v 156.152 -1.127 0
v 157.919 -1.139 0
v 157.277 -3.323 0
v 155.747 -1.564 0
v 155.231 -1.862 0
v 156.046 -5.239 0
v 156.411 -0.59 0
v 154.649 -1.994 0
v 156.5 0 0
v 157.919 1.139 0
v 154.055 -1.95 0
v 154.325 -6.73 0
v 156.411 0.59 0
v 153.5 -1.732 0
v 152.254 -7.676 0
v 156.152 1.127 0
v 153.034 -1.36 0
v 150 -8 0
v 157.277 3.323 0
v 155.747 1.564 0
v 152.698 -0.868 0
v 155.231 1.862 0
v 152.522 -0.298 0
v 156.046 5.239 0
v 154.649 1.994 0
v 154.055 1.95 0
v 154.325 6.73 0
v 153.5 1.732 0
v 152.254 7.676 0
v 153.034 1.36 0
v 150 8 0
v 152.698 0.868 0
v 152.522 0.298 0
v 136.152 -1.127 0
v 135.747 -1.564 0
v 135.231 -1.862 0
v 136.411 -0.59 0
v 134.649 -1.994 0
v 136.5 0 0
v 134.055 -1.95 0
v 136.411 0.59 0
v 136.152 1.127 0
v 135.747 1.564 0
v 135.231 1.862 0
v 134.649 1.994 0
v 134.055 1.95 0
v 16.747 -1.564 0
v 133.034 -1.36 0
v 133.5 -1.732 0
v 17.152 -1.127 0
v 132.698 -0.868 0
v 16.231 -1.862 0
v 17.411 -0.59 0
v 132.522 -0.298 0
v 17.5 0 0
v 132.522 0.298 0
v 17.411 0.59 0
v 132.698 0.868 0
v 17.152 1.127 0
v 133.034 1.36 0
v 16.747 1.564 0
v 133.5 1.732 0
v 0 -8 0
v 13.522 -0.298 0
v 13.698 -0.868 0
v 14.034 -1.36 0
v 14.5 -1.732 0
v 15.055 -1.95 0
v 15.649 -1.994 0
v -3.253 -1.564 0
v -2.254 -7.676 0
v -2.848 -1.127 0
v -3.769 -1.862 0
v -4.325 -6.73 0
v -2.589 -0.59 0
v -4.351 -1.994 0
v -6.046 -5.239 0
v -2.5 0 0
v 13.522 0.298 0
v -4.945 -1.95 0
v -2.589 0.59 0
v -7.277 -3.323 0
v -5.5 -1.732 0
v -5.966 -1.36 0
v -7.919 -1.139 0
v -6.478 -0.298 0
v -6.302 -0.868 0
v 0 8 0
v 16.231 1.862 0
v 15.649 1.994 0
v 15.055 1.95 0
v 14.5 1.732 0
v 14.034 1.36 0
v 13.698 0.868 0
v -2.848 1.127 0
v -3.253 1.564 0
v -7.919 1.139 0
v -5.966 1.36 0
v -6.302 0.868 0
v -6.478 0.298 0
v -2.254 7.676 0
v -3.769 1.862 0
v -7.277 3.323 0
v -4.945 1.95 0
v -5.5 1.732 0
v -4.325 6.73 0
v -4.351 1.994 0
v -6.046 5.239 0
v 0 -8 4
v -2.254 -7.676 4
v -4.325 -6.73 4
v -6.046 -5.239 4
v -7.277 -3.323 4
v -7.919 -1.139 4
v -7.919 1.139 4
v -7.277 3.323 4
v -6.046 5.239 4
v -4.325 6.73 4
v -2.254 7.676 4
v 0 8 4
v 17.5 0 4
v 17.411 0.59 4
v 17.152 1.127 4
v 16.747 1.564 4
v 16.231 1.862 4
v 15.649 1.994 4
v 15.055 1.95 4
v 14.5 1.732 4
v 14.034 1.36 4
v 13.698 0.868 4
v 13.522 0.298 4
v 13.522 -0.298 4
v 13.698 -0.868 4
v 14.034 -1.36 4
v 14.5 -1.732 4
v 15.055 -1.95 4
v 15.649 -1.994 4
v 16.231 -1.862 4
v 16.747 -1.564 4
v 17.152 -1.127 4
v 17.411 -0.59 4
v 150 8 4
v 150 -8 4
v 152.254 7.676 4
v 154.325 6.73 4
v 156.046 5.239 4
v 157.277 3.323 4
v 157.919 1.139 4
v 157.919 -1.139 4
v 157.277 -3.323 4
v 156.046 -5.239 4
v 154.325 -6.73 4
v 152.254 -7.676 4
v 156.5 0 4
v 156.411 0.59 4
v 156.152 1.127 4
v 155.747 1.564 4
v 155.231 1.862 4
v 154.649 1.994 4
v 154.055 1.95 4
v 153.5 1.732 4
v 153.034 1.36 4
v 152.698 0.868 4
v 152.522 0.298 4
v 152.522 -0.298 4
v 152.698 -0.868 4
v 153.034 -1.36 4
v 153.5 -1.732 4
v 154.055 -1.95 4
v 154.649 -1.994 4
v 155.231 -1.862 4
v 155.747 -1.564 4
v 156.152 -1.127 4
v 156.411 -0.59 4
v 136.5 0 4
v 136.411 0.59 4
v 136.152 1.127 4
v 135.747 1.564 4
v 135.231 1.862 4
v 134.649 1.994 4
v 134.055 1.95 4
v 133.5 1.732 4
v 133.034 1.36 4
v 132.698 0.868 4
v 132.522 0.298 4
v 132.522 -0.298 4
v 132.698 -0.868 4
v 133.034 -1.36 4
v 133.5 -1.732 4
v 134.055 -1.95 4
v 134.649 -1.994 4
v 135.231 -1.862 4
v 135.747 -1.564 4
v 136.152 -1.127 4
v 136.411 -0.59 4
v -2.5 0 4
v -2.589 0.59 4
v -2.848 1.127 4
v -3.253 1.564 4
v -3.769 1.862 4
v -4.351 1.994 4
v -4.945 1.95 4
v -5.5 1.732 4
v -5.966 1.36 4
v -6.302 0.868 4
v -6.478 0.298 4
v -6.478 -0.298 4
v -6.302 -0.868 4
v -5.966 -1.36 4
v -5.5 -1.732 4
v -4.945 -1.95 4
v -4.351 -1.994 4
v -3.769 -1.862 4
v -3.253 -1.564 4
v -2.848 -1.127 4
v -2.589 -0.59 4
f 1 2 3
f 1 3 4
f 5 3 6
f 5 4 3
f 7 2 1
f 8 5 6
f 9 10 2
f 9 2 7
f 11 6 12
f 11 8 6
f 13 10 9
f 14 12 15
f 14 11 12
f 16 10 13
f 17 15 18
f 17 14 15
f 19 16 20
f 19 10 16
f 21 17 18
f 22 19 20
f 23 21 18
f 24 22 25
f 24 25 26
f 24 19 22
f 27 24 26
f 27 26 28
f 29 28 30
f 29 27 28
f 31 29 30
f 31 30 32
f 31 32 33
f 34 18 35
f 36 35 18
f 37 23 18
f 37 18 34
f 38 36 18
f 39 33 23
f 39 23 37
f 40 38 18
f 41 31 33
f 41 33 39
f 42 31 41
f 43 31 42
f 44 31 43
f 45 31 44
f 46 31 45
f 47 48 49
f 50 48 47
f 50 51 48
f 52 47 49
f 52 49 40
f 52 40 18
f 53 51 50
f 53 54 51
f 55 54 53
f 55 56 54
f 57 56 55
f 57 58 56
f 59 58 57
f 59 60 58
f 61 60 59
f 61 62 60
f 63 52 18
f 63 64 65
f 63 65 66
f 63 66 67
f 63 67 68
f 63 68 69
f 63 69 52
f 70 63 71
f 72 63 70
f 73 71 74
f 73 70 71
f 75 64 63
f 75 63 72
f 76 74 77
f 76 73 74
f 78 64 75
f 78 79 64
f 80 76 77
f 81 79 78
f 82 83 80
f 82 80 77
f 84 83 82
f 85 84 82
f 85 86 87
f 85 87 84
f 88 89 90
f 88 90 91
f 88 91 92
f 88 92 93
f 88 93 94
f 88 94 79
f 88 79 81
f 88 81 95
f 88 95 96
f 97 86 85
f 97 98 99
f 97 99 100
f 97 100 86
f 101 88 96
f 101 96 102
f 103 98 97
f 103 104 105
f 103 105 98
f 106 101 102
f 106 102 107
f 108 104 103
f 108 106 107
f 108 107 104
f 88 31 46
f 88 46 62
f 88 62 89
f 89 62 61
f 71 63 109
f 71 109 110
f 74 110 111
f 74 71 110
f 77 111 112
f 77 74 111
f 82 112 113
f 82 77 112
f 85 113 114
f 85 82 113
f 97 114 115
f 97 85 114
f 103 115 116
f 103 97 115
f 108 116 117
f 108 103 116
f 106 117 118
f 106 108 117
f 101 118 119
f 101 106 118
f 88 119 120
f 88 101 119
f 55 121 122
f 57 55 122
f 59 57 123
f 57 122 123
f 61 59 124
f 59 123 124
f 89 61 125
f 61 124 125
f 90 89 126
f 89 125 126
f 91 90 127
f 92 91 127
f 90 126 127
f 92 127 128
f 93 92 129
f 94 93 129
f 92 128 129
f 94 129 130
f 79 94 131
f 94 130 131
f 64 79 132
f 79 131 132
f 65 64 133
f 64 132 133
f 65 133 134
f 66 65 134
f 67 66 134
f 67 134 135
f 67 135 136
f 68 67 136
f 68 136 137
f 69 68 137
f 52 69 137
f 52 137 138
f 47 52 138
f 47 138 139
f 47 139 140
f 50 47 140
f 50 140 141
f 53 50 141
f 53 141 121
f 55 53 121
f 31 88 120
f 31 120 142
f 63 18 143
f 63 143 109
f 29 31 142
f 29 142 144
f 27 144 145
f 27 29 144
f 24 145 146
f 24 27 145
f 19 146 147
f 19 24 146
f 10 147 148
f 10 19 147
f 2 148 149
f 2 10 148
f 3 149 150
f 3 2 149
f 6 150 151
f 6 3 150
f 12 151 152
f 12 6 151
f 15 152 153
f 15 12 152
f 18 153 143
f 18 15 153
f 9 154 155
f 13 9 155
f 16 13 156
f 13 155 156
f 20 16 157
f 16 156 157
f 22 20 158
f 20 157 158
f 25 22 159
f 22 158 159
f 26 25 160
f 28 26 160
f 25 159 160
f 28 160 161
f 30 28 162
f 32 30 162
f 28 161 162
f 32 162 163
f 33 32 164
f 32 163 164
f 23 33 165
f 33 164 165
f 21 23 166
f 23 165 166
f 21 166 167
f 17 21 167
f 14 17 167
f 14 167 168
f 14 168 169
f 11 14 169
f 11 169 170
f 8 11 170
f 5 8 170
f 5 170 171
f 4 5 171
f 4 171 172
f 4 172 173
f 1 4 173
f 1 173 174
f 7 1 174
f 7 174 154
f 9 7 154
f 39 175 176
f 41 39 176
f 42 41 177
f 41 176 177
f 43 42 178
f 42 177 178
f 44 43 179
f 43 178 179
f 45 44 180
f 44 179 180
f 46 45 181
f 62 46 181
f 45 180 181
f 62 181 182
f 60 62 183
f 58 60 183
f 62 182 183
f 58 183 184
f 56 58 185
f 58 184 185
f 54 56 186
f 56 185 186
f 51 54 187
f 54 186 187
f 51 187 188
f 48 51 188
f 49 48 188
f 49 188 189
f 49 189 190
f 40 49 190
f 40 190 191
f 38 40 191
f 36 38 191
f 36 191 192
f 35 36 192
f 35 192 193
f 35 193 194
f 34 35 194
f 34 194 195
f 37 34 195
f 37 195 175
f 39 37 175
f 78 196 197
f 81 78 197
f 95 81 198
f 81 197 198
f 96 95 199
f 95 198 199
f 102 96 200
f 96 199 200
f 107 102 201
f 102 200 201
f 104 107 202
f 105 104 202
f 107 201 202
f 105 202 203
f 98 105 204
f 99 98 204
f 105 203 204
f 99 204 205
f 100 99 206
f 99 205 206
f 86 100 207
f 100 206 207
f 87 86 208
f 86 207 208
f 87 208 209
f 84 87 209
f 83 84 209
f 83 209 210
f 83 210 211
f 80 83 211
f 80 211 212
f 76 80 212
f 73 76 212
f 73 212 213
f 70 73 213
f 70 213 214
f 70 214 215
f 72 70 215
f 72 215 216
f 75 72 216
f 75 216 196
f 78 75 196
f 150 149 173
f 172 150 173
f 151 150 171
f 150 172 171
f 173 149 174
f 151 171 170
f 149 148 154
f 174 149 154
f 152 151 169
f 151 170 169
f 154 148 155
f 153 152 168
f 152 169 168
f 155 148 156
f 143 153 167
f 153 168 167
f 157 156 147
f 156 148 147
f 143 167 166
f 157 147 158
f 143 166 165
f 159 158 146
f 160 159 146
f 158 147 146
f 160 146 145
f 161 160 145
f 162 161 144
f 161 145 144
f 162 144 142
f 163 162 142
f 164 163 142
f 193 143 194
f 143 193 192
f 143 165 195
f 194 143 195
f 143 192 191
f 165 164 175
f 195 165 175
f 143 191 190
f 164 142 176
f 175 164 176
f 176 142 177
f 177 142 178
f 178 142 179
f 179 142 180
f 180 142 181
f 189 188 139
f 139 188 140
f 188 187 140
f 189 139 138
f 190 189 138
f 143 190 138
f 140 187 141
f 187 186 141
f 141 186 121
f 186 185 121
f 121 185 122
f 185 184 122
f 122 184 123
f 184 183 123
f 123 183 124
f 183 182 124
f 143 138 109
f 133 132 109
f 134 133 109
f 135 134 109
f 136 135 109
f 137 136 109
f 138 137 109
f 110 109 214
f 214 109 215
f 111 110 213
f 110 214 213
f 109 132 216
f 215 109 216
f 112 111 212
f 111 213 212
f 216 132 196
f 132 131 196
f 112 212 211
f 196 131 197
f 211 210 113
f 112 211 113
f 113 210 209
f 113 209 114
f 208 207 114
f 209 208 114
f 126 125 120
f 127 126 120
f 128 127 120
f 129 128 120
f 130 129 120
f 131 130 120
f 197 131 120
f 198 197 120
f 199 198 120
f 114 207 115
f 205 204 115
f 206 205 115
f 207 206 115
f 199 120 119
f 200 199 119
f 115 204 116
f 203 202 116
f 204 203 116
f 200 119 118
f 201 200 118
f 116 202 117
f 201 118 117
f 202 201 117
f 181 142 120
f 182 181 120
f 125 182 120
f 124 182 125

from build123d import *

# Parameters (mm, degrees)
EXTRUDE_1_DEPTH     = 4
SKETCH_2_R          = 2
CUT_EXTRUDE_1_DEPTH = 10


with BuildPart() as part:
    # 草图1 → 凸台-拉伸1 (new body)
    with BuildSketch(Plane.XY):
        with BuildLine():
            Line((0, 8), (150, 8))
            ThreePointArc((150, 8), (158, 0), (150, -8))
            Line((150, -8), (0, -8))
            ThreePointArc((0, -8), (-8, 0), (0, 8))
        make_face()
    extrude(amount=EXTRUDE_1_DEPTH)

    # 草图2 → 切除-拉伸1 (cut)
    with BuildSketch(Plane.XY.offset(4)):
        with Locations((15.5, 0)):
            Circle(SKETCH_2_R)
        with Locations((134.5, 0)):
            Circle(SKETCH_2_R)
        with Locations((-4.5, 0)):
            Circle(SKETCH_2_R)
        with Locations((154.5, 0)):
            Circle(SKETCH_2_R)
    extrude(amount=-CUT_EXTRUDE_1_DEPTH, mode=Mode.SUBTRACT)


solid = part.part
